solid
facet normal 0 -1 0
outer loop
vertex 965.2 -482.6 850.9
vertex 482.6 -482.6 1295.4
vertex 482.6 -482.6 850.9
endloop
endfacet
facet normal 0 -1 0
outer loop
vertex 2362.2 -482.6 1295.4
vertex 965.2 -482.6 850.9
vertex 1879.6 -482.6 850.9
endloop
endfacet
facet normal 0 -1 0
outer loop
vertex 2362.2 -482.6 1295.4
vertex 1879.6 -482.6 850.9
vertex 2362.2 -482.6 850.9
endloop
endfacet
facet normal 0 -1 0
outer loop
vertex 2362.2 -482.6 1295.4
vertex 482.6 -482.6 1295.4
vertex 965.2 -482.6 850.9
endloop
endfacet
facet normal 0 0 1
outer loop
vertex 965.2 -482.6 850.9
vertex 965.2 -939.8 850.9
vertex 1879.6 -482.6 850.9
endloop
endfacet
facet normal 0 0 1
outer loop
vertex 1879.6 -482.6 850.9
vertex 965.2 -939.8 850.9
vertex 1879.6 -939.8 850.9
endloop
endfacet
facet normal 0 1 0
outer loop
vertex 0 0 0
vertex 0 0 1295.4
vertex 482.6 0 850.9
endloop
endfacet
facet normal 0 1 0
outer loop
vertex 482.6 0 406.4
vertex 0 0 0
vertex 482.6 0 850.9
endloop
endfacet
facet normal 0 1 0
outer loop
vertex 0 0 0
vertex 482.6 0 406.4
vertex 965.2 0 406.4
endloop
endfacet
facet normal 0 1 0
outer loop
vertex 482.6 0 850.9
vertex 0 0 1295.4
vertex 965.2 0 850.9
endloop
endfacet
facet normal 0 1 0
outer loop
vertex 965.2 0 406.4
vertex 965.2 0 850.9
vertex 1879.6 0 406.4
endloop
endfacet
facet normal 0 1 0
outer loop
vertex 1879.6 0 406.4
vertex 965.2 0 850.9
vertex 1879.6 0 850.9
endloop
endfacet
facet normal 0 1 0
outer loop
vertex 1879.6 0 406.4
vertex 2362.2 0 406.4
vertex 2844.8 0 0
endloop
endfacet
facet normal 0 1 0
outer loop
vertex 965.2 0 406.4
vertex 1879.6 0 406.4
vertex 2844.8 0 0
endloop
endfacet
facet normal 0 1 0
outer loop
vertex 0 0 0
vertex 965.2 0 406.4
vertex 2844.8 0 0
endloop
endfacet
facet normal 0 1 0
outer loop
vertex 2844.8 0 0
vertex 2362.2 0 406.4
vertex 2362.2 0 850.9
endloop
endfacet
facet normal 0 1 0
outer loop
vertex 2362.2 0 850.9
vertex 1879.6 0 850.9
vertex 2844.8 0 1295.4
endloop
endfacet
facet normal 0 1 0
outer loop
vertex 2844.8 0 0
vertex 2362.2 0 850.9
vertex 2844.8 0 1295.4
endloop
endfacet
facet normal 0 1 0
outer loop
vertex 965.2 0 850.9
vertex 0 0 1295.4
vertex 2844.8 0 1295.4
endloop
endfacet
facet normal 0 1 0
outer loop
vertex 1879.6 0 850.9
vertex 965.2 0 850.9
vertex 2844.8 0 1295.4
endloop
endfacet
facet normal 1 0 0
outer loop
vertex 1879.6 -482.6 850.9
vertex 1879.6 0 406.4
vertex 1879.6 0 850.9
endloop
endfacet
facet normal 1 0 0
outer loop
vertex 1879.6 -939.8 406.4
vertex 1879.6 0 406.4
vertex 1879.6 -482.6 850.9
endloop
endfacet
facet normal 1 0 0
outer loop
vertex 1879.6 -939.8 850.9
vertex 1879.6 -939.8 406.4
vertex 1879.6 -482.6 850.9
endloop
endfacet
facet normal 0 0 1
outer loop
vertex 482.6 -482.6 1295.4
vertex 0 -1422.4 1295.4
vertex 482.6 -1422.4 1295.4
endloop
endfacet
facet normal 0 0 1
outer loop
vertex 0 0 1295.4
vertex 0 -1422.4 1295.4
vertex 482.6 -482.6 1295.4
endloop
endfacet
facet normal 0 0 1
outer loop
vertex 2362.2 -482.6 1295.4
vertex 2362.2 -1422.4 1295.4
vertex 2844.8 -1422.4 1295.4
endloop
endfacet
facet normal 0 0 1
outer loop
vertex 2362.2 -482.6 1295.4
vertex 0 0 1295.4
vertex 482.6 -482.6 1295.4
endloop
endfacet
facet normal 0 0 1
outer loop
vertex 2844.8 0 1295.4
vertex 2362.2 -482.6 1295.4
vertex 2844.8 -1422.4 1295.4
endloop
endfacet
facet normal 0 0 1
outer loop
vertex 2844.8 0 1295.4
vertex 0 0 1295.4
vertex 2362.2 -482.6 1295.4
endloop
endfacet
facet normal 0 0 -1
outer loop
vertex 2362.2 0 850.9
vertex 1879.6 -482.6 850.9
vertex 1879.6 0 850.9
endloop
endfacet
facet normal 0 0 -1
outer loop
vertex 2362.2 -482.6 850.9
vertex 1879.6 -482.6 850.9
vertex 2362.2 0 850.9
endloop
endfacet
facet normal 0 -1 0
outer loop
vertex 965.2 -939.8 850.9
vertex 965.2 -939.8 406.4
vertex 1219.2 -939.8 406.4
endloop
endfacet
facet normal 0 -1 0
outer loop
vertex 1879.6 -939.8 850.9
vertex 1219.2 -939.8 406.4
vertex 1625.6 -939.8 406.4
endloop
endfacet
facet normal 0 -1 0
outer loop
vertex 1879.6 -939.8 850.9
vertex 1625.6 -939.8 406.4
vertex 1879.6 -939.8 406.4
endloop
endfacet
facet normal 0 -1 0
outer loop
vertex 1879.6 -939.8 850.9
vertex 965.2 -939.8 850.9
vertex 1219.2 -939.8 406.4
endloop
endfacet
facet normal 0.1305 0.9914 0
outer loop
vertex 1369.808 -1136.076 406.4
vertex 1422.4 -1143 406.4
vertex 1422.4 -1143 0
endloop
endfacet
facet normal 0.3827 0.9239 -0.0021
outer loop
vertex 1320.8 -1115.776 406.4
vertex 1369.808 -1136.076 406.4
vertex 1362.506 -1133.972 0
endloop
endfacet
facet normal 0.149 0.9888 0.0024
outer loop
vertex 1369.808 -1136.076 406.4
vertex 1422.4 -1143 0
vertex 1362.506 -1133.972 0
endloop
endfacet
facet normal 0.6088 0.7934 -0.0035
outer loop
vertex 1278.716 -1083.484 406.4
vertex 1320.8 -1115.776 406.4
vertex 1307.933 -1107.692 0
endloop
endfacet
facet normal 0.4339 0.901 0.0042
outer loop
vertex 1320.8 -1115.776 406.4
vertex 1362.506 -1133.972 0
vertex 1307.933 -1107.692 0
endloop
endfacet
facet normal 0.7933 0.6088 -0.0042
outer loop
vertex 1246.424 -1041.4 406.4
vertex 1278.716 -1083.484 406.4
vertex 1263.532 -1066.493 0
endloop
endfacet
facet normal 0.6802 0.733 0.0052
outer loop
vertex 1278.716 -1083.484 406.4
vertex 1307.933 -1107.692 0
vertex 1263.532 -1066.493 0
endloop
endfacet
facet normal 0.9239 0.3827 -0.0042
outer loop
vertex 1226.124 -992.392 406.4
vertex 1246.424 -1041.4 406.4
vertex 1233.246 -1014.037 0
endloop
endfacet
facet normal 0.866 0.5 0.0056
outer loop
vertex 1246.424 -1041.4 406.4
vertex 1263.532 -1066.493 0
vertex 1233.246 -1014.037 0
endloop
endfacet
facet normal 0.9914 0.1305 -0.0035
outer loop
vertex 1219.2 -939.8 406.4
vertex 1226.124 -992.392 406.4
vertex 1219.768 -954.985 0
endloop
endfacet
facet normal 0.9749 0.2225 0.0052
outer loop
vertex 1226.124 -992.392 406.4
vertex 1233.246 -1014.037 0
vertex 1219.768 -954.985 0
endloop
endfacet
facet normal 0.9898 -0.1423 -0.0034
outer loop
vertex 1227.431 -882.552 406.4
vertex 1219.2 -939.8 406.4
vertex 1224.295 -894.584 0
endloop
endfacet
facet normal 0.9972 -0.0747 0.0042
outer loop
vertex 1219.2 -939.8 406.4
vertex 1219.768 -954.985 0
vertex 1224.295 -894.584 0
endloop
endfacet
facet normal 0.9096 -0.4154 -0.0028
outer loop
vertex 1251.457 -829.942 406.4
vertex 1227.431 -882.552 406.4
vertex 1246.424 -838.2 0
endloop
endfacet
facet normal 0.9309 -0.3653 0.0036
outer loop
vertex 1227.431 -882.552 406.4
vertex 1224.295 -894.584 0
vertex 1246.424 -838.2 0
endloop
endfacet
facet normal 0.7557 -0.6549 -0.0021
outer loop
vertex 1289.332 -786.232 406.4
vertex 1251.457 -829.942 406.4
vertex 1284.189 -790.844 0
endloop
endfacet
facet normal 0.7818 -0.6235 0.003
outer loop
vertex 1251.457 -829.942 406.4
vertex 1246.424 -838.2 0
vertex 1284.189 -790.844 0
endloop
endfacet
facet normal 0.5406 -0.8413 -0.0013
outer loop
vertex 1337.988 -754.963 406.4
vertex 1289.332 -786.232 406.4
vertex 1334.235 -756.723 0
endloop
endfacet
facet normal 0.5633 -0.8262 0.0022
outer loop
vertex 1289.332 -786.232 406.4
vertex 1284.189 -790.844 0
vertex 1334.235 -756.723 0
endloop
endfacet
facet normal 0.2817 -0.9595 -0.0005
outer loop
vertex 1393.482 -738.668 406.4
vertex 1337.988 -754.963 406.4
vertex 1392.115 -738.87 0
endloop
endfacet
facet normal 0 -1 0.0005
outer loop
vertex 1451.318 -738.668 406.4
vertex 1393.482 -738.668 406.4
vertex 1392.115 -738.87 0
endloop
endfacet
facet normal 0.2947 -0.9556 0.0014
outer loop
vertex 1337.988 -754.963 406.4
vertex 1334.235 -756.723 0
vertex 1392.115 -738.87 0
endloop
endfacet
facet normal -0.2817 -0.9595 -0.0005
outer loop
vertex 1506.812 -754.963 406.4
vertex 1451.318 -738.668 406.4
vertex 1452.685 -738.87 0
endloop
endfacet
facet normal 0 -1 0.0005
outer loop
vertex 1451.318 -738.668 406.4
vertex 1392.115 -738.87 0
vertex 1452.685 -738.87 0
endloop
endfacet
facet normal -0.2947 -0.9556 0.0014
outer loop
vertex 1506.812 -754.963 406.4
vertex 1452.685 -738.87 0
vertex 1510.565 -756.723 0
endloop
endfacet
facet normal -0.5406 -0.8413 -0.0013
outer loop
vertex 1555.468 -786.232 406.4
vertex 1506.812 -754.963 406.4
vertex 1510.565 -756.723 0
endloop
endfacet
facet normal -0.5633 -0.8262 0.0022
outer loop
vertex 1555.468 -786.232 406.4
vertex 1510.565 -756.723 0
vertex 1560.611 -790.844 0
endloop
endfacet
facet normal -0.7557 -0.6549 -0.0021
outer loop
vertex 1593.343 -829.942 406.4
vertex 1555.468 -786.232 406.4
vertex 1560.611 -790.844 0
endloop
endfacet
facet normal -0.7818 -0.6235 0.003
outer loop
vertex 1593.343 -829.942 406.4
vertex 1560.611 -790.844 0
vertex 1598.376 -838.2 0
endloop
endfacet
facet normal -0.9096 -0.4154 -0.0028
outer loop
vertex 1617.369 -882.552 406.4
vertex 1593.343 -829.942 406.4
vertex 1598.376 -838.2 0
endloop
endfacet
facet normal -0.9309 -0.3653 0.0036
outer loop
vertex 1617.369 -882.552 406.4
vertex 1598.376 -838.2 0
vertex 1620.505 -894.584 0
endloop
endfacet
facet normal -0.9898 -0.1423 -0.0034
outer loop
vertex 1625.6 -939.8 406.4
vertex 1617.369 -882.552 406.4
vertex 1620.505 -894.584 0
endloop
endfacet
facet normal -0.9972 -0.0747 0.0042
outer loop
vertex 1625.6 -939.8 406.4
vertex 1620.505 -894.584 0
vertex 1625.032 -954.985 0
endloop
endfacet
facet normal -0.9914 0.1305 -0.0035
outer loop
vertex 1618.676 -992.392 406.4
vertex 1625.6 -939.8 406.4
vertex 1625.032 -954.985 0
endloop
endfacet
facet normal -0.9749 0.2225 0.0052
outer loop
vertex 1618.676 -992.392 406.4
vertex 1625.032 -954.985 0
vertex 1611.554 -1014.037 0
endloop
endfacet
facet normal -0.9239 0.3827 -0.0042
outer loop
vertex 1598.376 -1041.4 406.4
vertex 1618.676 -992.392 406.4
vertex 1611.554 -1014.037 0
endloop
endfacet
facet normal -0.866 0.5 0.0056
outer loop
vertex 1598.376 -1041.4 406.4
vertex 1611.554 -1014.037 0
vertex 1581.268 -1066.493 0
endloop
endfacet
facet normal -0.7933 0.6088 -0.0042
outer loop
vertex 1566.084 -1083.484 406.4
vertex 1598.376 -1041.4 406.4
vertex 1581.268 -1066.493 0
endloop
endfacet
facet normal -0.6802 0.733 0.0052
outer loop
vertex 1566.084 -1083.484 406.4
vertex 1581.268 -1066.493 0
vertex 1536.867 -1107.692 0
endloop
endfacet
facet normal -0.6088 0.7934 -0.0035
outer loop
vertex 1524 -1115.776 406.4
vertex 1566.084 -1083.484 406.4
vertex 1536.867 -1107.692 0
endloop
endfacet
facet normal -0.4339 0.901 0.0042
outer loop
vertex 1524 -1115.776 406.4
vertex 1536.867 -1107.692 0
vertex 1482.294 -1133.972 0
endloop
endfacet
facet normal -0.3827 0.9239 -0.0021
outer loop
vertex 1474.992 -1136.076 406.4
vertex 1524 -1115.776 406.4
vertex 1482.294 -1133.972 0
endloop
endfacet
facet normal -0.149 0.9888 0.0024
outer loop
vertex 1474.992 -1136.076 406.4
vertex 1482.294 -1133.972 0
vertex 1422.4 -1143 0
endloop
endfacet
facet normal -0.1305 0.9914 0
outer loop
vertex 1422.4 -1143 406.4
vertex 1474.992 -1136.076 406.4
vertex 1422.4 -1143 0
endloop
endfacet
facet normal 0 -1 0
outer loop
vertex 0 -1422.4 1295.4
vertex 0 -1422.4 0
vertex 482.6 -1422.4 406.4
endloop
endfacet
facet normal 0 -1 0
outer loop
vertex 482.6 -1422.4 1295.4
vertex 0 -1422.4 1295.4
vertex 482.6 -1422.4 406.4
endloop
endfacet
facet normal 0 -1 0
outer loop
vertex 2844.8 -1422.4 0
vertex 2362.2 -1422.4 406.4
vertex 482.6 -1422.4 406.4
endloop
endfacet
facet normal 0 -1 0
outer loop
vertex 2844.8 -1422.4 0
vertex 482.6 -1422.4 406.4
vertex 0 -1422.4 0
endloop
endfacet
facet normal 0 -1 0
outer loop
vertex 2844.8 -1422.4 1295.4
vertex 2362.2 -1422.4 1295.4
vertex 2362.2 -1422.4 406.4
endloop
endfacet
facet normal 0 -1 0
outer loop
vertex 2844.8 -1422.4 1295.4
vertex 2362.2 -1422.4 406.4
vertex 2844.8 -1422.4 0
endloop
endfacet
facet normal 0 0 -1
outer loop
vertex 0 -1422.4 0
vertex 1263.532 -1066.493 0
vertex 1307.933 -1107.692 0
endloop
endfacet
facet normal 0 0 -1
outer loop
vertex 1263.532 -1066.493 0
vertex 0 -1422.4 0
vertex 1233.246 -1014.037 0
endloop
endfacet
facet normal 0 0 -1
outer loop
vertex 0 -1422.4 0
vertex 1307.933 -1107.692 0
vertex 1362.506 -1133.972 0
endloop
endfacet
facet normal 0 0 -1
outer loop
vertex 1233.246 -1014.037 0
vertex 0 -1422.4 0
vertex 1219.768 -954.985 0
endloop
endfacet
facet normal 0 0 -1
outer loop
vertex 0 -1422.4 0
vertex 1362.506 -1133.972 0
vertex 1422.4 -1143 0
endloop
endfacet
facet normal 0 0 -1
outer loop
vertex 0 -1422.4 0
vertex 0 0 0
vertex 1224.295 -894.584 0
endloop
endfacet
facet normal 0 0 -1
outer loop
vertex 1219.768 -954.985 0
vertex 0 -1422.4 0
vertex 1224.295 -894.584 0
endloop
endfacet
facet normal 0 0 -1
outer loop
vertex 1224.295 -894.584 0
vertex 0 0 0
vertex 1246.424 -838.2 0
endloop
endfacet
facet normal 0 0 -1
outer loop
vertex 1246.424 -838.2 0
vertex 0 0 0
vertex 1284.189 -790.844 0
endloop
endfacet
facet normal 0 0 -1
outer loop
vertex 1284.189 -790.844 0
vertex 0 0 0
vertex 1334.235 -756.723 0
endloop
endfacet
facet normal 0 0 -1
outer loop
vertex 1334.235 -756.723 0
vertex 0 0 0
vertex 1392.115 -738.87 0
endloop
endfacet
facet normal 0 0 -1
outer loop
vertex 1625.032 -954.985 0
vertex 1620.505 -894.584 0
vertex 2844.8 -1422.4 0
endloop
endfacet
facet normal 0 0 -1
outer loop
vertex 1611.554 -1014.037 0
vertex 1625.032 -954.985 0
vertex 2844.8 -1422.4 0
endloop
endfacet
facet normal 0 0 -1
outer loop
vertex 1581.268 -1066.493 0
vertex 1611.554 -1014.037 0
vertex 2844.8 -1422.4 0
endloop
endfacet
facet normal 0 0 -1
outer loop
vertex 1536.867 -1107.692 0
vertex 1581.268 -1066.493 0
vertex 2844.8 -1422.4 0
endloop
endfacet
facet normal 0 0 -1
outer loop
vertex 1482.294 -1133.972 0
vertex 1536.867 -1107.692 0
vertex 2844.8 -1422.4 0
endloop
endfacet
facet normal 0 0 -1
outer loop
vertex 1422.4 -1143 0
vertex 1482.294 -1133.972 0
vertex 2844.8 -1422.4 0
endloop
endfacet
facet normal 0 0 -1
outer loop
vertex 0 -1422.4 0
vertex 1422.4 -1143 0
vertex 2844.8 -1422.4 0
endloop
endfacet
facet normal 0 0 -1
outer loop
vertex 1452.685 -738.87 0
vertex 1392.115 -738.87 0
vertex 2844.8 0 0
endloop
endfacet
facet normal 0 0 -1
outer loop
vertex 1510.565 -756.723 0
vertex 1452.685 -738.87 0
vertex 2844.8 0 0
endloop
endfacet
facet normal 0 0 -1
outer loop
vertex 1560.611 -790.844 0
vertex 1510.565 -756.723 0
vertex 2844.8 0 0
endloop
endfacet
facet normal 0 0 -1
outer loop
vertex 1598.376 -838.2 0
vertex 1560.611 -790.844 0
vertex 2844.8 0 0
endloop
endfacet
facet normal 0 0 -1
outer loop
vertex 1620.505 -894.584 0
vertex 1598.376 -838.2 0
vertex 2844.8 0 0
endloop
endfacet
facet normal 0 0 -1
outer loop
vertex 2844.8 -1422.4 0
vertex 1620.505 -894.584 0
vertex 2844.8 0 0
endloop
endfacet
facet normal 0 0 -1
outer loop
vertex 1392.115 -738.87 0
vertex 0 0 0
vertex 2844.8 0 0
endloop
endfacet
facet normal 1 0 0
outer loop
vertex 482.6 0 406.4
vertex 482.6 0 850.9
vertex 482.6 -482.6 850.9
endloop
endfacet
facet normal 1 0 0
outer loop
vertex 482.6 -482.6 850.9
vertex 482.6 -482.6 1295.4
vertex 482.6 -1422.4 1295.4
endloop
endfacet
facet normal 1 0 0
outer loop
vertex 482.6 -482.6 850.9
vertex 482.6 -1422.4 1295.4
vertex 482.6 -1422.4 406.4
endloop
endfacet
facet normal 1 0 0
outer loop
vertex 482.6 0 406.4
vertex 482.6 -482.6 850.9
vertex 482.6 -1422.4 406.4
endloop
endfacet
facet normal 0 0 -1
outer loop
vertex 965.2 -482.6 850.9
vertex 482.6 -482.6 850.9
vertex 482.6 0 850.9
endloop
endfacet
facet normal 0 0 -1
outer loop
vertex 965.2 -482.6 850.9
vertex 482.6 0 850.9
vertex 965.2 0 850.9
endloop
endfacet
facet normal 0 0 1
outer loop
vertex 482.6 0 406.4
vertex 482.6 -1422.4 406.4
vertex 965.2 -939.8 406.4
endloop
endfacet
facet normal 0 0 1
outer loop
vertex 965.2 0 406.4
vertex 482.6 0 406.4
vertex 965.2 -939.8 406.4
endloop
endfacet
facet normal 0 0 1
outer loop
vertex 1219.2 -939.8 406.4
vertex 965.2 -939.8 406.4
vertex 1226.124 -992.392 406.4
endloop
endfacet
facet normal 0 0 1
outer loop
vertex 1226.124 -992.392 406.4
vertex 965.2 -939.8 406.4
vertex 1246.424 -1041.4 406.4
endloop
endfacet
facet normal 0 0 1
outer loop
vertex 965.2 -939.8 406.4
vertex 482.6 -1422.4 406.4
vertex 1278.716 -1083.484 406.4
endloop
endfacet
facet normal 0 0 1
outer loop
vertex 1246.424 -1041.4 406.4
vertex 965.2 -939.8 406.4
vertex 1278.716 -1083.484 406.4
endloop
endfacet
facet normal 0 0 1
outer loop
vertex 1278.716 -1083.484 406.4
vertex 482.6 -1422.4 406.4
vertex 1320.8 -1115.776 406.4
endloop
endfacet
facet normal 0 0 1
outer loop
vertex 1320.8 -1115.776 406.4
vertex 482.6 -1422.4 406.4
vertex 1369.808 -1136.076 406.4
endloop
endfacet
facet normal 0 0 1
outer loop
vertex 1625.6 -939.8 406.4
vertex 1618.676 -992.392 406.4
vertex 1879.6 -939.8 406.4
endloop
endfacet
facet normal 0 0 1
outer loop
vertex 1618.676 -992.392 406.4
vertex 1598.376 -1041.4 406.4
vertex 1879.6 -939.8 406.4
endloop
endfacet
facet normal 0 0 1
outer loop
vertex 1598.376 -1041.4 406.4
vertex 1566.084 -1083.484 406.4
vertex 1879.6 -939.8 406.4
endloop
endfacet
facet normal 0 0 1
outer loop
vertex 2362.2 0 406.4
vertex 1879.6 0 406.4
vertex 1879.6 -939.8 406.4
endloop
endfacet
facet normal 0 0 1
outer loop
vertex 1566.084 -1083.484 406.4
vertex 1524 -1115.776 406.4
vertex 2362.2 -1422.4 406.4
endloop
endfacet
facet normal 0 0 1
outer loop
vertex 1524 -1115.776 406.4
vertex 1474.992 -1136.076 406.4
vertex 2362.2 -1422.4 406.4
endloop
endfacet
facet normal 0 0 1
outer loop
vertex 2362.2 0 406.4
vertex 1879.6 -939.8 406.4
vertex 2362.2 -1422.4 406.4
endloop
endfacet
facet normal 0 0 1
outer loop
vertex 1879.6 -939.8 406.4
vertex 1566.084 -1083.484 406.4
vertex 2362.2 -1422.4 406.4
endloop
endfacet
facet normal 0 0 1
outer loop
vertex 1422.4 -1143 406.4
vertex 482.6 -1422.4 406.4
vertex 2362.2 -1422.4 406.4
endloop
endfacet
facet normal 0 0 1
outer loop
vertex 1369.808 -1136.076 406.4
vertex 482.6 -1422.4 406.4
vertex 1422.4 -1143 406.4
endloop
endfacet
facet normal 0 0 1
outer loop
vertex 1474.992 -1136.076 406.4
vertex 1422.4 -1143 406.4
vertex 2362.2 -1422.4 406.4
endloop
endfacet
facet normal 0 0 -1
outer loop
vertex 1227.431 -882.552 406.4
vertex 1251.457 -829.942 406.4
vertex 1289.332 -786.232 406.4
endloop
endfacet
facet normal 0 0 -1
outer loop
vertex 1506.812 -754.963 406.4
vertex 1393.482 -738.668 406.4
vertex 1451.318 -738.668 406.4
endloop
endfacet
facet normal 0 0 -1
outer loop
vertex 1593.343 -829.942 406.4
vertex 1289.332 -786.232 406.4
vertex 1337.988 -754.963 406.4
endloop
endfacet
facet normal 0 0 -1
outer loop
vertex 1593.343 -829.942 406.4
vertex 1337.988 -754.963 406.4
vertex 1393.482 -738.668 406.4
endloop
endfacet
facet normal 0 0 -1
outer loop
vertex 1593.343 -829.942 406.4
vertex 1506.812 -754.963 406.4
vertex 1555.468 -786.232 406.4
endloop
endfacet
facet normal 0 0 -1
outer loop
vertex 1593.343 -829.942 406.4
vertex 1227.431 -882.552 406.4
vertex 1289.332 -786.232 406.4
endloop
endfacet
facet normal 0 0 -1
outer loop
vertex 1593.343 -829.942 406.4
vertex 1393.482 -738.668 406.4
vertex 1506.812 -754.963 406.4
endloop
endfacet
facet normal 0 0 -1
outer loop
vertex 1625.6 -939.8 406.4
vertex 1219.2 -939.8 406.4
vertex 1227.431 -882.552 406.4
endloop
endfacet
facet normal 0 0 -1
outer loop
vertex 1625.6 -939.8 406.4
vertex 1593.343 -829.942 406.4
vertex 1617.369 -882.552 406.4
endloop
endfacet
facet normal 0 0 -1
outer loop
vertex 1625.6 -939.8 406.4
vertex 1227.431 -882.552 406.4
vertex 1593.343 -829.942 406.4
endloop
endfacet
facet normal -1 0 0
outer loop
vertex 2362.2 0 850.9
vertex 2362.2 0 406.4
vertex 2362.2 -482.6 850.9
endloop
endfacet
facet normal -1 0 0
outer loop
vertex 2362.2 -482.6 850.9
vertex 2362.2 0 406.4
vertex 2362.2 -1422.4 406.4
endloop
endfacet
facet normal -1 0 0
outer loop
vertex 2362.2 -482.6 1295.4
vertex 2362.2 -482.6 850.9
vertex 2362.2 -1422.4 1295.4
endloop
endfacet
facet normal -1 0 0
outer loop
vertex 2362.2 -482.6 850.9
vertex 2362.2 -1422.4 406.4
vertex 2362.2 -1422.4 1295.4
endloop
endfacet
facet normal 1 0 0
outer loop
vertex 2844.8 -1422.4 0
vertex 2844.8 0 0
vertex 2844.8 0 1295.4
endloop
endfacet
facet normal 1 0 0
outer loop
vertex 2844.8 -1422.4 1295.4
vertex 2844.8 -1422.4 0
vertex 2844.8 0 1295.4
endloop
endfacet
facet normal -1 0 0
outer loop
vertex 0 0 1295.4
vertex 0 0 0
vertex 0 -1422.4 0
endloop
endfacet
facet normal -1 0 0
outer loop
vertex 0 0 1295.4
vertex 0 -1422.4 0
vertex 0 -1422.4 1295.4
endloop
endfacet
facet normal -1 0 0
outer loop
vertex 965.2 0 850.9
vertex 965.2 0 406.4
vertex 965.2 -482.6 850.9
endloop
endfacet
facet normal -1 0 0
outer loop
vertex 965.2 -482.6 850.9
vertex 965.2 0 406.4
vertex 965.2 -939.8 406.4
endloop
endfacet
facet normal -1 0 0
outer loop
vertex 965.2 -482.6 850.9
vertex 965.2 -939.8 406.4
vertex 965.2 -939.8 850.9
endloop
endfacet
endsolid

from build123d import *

# Parameters (mm, degrees)
F0_W      = 2844.8
F0_H      = 1295.4
F1_DEPTH  = 1447.8
F2_W      = 482.6
F2_H      = 444.5
F4_DEPTH  = 965.2
F5_W      = 482.6
F5_H      = 444.5
F6_DEPTH  = 508
F8_DEPTH  = 25.4
F9_W      = 914.4
F9_H      = 444.5
F10_DEPTH = 482.6
F12_DEPTH = 406.4


with BuildPart() as f1:
    # F0 (on Front) → F1 (new body)
    with BuildSketch(Plane.XZ):
        with Locations((1422.4, 647.7)):
            Rectangle(F0_W, F0_H)
    extrude(amount=F1_DEPTH)

    # F2 (on face) → F4 (cut)
    with BuildSketch(Plane.XZ.offset(1447.8)):
        Polygon((2362.2, 1295.4), (482.6, 1295.4), (482.6, 850.9), (965.2, 850.9), (1879.6, 850.9), (2362.2, 850.9), align=None)
        Polygon((965.2, 850.9), (482.6, 850.9), (482.6, 406.4), (869.3156242371, 406.4), (965.2, 406.4), align=None)
        with Locations((2120.9, 628.65)):
            Rectangle(F2_W, F2_H)
    extrude(amount=-F4_DEPTH, mode=Mode.SUBTRACT)

    # F5 (on face) → F6 (cut)
    with BuildSketch(Plane.XZ.offset(482.6)):
        with Locations((723.9, 628.65)):
            Rectangle(F5_W, F5_H)
        with Locations((2120.9, 628.65)):
            Rectangle(F5_W, F5_H)
    extrude(amount=-F6_DEPTH, mode=Mode.SUBTRACT)

    # F7 (on face) → F8 (cut)
    with BuildSketch(Plane.XZ.offset(1447.8)):
        Polygon((482.6, 406.4), (482.6, 1295.4), (0, 1295.4), (0, 0), (2844.8, 0), (2844.8, 1295.4), (2362.2, 1295.4), (2362.2, 406.4), (1879.6, 406.4), (1879.6, 850.9), (965.2, 850.9), (965.2, 406.4), align=None)
    extrude(amount=-F8_DEPTH, mode=Mode.SUBTRACT)

    # F9 (on face) → F10 (cut)
    with BuildSketch(Plane.XZ.offset(1422.4)):
        with Locations((1422.4, 628.65)):
            Rectangle(F9_W, F9_H)
    extrude(amount=-F10_DEPTH, mode=Mode.SUBTRACT)

    # F11 (on face) → F12 (cut)
    with BuildSketch(Plane(origin=(0, 0, 0), x_dir=(1, 0, 0), z_dir=(0, 0, -1))):
        with BuildLine():
            ThreePointArc((1625.6, 939.8), (1566.0840979371, 1083.4840979371), (1422.4, 1143))
            ThreePointArc((1422.4, 1143), (1278.7159020629, 796.1159020629), (1625.6, 939.8))
        make_face()
    extrude(amount=-F12_DEPTH, mode=Mode.SUBTRACT)


solid = f1.part
